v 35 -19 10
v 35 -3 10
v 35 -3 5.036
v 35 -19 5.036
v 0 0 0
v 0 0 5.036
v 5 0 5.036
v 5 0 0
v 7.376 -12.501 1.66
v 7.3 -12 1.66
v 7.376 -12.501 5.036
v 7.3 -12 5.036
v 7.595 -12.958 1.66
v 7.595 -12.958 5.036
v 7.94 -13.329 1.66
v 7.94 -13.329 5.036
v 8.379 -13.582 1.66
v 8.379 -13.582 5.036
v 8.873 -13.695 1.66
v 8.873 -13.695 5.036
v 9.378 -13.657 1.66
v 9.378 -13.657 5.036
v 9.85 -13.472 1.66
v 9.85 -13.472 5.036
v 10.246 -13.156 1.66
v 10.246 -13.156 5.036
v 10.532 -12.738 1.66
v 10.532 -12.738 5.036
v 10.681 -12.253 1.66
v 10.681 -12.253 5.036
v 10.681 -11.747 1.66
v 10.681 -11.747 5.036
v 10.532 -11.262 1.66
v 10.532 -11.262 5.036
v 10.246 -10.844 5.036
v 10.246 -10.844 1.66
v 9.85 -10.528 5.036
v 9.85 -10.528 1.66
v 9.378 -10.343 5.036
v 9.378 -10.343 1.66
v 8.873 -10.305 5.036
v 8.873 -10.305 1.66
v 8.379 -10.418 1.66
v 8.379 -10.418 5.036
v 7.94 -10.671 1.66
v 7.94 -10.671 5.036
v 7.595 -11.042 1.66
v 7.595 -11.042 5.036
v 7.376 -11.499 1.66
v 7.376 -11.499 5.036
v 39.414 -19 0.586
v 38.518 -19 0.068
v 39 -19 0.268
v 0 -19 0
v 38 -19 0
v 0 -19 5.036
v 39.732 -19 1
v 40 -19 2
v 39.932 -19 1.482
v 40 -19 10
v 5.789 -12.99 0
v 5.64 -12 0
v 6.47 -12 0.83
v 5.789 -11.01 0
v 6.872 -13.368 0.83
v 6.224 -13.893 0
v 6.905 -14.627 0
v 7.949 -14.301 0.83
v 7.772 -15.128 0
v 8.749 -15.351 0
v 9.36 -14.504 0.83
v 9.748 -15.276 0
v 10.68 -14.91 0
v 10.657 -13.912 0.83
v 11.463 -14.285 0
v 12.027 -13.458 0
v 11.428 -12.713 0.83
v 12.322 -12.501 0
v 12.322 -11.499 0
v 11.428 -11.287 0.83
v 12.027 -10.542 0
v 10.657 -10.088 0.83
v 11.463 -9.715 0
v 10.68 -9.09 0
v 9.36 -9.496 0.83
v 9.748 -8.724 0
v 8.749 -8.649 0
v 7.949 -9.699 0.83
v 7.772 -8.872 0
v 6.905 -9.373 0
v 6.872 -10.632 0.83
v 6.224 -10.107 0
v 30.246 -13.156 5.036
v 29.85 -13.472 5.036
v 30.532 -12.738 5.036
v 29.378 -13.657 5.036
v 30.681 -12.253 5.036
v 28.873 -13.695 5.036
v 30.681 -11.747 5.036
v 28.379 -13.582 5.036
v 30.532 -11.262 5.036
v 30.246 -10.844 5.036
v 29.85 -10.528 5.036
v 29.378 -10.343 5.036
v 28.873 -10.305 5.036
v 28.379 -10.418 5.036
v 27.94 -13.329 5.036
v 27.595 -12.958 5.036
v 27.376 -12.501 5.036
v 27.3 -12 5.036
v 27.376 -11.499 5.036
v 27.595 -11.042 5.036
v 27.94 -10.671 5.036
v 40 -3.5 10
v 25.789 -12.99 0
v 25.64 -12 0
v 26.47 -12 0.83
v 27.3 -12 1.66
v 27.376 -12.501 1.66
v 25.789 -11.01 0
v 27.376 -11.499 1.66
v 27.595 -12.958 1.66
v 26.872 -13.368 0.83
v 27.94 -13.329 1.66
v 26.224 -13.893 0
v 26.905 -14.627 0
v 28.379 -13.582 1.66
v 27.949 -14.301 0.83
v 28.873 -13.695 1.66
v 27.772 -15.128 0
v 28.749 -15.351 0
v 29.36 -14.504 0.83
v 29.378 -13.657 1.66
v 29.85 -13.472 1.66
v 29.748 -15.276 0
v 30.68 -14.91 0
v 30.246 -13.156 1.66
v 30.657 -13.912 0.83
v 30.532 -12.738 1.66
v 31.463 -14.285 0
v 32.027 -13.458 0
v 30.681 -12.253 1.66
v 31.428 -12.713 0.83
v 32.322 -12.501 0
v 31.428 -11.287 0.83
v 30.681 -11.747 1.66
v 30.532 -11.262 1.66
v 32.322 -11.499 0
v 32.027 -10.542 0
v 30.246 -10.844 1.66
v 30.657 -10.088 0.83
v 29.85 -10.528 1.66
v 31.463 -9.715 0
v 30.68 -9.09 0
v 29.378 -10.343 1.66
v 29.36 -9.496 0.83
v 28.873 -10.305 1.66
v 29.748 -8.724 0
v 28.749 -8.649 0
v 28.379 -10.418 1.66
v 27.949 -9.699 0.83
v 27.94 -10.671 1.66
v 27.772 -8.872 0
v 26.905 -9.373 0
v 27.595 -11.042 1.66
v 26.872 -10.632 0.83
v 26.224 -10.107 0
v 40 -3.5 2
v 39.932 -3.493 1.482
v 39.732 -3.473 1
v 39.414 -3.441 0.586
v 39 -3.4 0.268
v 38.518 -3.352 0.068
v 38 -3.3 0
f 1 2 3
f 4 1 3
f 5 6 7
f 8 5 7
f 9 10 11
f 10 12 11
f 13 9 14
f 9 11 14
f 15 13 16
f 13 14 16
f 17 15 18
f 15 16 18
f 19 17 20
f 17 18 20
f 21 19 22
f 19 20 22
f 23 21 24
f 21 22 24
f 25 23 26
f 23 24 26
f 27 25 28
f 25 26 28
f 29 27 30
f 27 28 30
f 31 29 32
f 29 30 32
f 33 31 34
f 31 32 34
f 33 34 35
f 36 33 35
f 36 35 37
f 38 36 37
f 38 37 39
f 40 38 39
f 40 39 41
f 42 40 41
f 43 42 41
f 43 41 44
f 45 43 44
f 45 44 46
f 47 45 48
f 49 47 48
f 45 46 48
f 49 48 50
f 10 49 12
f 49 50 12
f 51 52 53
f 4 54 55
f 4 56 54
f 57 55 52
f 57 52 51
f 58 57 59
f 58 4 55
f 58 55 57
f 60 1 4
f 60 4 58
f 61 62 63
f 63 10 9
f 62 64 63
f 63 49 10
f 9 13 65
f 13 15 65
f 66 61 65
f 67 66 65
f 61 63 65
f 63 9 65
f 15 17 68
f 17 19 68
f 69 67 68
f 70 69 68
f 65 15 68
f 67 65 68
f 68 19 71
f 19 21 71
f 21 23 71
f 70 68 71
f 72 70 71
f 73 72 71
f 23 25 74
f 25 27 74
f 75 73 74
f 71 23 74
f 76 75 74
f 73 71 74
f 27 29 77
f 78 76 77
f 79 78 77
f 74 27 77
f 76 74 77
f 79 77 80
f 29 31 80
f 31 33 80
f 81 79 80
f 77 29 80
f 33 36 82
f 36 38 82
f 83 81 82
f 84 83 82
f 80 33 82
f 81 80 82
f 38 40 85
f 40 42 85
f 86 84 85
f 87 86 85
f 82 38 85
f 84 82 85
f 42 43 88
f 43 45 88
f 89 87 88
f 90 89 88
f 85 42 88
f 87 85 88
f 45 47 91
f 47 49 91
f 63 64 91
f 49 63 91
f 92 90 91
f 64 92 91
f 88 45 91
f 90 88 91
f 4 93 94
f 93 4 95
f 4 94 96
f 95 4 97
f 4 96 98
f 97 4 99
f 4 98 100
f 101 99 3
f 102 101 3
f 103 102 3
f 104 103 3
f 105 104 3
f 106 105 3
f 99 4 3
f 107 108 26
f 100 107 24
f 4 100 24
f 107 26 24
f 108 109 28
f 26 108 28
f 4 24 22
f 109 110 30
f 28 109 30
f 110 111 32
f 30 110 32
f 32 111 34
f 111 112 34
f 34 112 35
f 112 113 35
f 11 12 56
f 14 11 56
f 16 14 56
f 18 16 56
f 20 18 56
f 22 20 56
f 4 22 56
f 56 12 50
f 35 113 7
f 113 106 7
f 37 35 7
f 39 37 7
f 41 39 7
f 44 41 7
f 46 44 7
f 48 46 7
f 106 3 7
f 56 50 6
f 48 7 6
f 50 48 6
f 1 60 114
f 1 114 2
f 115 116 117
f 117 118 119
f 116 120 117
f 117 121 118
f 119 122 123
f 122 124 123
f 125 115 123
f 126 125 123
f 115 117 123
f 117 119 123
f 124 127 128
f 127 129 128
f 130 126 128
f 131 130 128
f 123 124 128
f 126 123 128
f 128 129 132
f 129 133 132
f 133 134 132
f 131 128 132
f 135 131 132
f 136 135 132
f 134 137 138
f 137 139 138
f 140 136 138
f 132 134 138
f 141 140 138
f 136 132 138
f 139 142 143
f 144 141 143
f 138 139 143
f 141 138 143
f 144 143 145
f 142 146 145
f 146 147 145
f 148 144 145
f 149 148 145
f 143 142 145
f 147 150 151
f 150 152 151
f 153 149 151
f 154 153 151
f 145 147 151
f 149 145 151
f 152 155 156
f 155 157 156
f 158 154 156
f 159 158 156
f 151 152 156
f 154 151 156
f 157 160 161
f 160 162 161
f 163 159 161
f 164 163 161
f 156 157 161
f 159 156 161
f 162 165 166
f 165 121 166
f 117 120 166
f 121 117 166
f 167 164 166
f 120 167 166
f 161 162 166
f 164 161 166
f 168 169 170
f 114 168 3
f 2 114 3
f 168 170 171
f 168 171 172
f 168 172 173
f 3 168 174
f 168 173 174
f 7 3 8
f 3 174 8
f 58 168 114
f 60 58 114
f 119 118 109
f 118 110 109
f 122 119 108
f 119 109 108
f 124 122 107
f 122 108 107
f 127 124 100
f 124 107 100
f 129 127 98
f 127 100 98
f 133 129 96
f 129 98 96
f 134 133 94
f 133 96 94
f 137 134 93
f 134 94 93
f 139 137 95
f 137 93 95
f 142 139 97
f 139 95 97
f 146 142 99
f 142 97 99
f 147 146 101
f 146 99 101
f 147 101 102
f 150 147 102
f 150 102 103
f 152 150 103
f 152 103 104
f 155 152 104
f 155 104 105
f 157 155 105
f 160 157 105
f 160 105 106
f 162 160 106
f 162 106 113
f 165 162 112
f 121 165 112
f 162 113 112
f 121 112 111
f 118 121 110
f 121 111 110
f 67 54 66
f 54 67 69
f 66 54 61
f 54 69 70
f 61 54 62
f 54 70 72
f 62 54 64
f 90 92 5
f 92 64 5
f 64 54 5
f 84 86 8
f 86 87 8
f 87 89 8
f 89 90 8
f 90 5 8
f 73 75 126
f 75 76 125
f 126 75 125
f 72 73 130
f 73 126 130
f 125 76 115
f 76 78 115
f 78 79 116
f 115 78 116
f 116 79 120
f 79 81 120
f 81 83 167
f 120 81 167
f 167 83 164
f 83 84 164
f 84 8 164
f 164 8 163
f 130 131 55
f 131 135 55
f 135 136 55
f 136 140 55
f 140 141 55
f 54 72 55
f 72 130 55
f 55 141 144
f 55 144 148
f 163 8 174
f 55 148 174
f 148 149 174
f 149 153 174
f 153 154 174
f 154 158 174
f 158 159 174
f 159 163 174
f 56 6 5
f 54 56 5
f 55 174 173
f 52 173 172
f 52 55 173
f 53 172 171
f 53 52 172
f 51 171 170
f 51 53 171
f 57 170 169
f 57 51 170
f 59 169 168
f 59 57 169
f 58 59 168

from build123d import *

# Parameters (mm, degrees)
F1_DEPTH       = 19
F3_D           = 3.4
F3_CSINK_D     = 6.72
F3_CSINK_ANGLE = 90
F5_DEPTH       = 25
F6_R           = 2


with BuildPart() as f1:
    # F0 (on Front) → F1 (new body)
    with BuildSketch(Plane.XZ):
        Polygon((0, 5.0361528993), (0, 0), (40, 0), (40, 10), (35, 10), (35, 5.0361528993), align=None)
    extrude(amount=F1_DEPTH)

    # F3 (through all)
    with Locations(Plane(origin=(0, 0, 0), x_dir=(1, 0, 0), z_dir=(0, 0, -1))):
        with Locations((9, 12), (29, 12)):
            CounterSinkHole(F3_D / 2, F3_CSINK_D / 2, counter_sink_angle=F3_CSINK_ANGLE)

    # F4 (on face) → F5 (cut)
    with BuildSketch(Plane(origin=(0, 0, 0), x_dir=(1, 0, 0), z_dir=(0, 0, -1))):
        Polygon((40, 3.5), (5, 0), (40, 0), align=None)
    extrude(amount=-F5_DEPTH, mode=Mode.SUBTRACT)

    # F6
    f6_edges = [f1.edges().sort_by_distance(p)[0] for p in [
        (40, -11.25, 0),
    ]]
    fillet(f6_edges, radius=F6_R)


solid = f1.part
